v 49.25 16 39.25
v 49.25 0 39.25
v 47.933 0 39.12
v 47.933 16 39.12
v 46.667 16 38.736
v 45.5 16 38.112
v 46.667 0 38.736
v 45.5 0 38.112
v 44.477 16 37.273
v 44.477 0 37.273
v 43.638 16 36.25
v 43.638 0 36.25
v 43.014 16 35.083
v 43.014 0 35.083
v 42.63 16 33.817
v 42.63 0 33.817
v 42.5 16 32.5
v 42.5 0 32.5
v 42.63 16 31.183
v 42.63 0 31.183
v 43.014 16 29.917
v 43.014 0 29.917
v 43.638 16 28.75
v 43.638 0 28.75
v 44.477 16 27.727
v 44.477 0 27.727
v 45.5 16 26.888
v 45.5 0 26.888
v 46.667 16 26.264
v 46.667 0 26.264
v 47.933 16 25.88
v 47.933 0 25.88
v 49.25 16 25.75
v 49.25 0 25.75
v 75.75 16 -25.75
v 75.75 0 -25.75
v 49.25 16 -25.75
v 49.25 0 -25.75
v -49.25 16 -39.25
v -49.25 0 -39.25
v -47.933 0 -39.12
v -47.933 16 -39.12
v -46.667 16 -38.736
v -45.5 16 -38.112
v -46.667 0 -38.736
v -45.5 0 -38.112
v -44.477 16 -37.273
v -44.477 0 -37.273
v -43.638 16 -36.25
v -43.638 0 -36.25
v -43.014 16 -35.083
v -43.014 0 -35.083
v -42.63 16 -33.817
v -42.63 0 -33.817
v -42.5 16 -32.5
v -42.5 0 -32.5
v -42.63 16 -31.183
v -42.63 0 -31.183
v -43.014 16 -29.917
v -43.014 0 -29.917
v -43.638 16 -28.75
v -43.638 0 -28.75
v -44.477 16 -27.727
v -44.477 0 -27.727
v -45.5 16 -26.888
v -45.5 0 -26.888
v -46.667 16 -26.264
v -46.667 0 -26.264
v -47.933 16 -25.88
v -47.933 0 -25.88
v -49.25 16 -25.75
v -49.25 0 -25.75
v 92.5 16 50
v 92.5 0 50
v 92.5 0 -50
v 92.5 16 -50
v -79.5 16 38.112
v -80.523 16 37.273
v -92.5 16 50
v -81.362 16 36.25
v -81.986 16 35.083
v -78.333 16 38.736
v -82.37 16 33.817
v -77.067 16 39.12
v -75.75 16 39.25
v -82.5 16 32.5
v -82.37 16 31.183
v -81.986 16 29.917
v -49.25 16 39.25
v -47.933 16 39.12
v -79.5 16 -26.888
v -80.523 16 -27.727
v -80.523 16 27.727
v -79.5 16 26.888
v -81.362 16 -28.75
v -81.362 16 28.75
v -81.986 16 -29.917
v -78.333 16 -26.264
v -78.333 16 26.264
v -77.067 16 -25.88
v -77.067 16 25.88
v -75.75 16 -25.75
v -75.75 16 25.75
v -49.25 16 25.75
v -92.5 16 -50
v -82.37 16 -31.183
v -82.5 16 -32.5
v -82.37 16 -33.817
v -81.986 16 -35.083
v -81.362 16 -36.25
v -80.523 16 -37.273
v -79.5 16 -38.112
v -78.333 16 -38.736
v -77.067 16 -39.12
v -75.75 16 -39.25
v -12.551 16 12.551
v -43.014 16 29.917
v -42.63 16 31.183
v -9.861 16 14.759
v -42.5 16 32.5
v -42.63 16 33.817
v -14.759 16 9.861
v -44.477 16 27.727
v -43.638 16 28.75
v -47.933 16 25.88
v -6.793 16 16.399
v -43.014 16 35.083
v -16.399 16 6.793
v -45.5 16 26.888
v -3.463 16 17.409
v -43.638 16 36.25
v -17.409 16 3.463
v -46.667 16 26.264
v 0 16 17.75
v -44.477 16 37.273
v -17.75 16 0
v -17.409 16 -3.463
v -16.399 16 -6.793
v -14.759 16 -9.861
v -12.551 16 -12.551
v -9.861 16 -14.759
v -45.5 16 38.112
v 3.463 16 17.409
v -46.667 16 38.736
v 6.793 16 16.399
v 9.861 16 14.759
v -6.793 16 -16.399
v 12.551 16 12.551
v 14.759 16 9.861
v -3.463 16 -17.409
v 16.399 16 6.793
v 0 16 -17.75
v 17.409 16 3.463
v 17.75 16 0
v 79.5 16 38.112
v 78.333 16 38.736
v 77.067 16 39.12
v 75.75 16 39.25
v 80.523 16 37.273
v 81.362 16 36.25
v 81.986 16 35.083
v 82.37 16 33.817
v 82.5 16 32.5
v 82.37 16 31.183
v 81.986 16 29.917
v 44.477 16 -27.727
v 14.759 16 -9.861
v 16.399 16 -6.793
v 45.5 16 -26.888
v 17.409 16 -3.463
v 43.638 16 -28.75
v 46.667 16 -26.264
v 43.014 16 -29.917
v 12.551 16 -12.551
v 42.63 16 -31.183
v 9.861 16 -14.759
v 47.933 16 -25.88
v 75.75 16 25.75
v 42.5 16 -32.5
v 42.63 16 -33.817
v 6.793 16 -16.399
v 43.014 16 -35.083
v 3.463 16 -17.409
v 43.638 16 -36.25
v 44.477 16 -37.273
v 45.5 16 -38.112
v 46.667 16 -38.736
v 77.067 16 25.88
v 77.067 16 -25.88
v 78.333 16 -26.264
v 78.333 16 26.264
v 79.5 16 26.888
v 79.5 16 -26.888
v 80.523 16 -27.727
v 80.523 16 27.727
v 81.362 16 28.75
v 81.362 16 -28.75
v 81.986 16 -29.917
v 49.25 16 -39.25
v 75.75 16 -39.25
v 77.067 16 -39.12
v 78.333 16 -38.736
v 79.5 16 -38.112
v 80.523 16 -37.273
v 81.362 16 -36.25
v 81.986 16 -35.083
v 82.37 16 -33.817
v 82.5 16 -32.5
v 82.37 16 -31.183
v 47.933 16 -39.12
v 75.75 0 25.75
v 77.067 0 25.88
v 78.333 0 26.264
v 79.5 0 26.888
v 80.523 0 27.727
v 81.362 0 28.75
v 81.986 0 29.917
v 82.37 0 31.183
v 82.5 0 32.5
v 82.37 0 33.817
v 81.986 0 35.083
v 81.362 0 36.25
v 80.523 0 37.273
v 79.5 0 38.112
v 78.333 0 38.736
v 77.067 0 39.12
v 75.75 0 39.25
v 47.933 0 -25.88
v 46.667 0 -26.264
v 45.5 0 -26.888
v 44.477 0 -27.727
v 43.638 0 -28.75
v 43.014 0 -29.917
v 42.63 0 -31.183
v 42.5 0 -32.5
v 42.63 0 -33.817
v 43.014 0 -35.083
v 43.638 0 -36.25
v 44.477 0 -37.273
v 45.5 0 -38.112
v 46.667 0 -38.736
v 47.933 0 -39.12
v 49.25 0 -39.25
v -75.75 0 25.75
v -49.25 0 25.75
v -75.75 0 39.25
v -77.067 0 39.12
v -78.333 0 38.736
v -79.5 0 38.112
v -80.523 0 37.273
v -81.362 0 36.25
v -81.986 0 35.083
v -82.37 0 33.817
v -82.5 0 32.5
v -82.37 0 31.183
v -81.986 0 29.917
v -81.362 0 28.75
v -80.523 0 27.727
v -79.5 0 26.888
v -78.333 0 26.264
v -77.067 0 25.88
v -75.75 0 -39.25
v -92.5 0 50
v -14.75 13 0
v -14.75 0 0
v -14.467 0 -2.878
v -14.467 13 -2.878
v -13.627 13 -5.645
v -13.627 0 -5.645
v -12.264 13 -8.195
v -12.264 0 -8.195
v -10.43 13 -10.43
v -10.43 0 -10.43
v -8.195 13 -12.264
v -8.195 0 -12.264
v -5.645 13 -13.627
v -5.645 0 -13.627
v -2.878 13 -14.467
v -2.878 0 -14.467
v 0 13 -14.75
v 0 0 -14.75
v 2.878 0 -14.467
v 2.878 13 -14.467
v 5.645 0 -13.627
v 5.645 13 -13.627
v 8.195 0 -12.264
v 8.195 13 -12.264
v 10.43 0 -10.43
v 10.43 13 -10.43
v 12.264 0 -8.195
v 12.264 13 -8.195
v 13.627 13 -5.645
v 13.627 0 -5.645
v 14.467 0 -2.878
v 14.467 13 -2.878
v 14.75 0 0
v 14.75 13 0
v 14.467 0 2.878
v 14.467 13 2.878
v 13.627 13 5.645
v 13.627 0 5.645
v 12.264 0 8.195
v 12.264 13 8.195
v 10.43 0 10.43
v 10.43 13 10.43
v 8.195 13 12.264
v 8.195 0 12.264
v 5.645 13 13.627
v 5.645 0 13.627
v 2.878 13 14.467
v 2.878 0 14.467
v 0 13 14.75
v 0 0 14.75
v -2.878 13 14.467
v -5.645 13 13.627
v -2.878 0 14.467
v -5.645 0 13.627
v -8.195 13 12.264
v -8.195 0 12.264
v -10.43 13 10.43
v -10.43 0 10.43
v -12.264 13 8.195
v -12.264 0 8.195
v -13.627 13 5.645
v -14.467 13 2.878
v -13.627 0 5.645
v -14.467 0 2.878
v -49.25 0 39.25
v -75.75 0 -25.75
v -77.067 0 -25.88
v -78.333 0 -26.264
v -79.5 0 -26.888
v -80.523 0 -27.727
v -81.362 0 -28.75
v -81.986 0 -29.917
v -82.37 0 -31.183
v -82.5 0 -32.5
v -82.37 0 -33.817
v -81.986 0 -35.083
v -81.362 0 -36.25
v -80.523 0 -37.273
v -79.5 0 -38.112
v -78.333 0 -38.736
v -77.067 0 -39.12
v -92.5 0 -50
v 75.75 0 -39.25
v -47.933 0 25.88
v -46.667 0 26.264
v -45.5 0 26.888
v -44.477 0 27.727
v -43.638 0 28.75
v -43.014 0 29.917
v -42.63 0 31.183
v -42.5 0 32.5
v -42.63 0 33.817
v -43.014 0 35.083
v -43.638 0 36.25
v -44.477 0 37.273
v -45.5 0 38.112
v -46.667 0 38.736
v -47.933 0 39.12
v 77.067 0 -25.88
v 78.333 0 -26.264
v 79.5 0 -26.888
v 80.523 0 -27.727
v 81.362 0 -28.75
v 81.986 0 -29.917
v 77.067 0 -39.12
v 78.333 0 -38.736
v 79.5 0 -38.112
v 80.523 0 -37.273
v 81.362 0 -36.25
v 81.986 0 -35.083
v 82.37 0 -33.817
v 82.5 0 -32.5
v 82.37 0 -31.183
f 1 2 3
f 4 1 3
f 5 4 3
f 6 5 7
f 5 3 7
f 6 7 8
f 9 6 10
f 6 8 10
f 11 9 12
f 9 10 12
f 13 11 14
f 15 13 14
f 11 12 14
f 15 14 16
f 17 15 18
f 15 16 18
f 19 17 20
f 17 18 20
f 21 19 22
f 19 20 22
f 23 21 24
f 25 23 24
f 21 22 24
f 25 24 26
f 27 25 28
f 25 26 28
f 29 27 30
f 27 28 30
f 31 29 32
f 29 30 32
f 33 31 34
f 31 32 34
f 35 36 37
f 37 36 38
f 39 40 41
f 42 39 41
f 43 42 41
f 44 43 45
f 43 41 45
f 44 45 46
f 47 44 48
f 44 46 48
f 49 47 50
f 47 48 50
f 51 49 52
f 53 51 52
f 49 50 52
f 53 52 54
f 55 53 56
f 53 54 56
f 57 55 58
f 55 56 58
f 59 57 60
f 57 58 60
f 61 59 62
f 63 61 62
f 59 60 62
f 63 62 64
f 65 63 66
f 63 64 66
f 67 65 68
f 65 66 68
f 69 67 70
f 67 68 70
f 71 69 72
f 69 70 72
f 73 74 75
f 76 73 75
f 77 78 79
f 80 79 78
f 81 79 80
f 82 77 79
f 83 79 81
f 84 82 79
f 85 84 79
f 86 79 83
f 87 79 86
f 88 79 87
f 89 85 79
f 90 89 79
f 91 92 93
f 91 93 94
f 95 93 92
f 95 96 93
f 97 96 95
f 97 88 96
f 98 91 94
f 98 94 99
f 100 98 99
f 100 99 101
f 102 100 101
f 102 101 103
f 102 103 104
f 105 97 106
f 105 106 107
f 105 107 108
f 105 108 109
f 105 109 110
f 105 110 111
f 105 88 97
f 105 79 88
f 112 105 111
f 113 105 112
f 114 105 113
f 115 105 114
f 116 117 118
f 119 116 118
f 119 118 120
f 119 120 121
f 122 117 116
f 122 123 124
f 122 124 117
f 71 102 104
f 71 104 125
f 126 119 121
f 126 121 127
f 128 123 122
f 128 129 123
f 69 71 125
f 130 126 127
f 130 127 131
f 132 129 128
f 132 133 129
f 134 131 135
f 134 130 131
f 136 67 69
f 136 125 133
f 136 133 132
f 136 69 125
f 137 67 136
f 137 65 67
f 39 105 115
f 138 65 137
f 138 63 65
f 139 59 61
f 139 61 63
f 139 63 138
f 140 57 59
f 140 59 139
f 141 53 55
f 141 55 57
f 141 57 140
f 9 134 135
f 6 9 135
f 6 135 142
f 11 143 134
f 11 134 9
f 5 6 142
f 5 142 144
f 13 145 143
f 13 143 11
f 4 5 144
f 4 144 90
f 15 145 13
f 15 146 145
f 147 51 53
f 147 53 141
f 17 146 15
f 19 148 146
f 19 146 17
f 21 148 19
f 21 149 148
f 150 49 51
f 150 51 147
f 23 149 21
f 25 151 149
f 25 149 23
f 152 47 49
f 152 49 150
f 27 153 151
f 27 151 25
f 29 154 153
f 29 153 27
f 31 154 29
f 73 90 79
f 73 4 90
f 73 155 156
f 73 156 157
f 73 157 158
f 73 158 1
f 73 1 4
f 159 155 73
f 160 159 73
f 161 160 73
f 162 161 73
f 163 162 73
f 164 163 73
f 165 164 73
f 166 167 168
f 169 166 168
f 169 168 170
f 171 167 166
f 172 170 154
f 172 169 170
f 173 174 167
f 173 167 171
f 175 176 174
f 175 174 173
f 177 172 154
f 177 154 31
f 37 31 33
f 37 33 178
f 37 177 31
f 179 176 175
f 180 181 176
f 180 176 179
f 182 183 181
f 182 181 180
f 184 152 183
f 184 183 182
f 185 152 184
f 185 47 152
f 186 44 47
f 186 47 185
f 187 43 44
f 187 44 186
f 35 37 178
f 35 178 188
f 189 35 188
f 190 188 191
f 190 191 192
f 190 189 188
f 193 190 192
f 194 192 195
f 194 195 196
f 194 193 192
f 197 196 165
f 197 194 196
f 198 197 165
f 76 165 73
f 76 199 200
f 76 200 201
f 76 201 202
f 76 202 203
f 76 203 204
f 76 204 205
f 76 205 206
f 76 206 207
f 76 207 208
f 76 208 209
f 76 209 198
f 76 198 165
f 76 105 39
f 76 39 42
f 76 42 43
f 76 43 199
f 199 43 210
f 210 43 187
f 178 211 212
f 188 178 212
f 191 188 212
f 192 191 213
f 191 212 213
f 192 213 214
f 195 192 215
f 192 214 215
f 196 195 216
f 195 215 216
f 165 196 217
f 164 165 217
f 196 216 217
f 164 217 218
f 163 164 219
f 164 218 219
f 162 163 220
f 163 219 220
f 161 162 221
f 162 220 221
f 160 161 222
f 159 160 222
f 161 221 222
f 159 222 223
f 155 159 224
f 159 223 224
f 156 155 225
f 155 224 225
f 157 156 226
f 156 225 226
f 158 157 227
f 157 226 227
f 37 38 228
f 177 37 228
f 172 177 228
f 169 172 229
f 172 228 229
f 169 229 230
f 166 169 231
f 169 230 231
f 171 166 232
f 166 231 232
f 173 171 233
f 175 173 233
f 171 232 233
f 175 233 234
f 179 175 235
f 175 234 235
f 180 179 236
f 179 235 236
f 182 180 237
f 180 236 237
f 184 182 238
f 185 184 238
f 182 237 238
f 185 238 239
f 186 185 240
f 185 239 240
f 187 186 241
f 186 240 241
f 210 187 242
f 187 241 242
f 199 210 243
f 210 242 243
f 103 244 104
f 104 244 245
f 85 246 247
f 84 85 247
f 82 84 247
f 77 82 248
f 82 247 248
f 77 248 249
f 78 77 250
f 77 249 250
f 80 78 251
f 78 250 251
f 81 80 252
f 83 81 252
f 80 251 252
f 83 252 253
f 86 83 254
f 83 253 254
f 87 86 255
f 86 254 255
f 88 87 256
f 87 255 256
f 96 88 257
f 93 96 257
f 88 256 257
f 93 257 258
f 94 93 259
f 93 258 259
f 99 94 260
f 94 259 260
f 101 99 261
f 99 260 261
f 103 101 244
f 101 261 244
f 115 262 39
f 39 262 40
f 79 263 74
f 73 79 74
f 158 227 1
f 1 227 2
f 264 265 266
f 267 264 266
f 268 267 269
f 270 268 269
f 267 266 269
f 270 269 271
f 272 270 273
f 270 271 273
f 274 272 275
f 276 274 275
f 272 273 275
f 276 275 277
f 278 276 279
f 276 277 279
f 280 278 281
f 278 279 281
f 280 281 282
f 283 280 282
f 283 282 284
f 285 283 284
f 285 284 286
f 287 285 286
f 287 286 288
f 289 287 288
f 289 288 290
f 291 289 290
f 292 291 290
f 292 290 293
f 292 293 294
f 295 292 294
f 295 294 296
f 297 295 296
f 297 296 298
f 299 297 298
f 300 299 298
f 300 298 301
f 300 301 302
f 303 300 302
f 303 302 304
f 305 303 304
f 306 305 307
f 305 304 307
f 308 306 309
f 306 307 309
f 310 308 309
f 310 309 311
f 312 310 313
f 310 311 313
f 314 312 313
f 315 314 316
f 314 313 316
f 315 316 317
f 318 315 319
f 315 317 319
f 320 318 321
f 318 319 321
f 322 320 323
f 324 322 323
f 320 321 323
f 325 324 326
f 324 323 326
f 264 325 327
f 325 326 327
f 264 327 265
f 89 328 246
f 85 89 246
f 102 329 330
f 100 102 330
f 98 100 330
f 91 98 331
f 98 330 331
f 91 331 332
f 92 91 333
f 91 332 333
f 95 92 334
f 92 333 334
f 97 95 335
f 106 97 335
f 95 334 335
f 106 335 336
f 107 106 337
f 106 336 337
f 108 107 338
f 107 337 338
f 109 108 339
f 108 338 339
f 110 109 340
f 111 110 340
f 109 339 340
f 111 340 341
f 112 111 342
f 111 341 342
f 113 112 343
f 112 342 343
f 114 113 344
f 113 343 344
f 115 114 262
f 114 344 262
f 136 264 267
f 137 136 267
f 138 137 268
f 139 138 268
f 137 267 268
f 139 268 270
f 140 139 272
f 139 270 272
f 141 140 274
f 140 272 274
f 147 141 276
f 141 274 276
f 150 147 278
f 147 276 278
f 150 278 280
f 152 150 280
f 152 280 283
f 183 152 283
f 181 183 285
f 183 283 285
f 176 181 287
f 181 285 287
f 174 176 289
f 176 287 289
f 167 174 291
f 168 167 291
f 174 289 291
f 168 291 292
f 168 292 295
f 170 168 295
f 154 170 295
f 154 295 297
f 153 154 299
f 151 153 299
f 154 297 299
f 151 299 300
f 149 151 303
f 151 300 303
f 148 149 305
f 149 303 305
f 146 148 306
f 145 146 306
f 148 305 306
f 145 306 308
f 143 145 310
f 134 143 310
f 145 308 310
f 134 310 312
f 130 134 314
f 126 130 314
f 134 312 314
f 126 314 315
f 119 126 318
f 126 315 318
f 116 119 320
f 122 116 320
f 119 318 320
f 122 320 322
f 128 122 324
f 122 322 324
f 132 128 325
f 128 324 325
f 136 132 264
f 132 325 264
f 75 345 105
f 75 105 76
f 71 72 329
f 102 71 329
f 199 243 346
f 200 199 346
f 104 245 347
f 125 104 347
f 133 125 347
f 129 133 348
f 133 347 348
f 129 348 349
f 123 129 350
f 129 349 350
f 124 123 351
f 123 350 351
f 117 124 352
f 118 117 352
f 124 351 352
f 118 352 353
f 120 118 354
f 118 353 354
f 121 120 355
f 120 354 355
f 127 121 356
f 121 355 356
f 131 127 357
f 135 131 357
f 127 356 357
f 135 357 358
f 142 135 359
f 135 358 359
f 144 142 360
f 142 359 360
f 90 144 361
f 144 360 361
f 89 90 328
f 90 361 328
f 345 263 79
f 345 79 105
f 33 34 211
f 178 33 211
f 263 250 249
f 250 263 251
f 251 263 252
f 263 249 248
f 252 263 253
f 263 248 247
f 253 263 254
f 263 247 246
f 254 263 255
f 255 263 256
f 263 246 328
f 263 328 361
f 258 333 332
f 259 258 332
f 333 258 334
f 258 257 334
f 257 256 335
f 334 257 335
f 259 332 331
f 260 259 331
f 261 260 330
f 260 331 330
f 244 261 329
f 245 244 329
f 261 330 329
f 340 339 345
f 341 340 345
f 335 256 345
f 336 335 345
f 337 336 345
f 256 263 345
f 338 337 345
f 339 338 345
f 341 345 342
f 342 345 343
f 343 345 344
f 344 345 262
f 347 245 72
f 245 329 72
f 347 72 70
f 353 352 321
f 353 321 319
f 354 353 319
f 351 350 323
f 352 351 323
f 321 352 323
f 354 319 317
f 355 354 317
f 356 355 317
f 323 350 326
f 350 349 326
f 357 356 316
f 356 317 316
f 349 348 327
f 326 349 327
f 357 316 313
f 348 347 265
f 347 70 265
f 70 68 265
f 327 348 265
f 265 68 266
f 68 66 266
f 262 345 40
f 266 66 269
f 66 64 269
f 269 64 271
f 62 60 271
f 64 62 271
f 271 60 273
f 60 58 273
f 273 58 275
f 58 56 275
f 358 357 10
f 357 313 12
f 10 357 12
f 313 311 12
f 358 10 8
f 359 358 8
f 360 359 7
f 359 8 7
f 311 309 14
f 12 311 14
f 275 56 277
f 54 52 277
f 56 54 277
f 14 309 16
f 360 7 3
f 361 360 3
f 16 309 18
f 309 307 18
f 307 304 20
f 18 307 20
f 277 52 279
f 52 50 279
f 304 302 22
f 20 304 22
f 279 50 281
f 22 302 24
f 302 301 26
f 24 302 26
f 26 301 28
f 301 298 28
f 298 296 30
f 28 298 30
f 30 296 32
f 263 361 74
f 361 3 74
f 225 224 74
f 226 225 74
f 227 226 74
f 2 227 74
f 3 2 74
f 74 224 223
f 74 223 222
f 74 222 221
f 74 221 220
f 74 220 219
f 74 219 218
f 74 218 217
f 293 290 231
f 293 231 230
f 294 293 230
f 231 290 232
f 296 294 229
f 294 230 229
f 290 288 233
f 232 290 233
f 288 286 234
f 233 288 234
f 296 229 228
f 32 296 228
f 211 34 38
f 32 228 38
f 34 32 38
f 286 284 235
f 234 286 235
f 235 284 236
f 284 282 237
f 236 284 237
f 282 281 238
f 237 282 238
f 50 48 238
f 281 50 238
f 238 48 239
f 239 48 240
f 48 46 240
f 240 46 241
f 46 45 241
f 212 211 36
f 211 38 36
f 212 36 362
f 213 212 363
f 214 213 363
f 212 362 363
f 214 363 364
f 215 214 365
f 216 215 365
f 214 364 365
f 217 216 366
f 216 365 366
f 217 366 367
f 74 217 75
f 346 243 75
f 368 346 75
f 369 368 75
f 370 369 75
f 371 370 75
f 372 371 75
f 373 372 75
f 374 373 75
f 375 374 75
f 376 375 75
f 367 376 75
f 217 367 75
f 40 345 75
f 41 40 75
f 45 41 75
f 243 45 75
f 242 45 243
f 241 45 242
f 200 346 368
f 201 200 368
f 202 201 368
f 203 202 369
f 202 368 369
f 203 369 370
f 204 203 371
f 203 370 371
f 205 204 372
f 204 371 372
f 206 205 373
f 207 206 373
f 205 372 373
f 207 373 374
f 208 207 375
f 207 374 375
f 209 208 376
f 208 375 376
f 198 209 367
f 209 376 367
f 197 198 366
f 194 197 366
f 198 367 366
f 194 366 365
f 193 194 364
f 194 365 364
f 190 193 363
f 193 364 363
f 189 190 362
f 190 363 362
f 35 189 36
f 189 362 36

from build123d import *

# Parameters (mm, degrees)
SKETCH1_W               = 185
SKETCH1_H               = 100
BOSS_EXTRUDE1_DEPTH     = 16
CUT_EXTRUDE1_DEPTH      = 107.359061673
CUT_EXTRUDE1_DEPTH_BACK = 107.359061673
F_1_0MM_DOWEL_HOLE1_D   = 29.5
CHAMFER1_SIZE           = 3


with BuildPart() as part:
    # Sketch1 → Boss-Extrude1 (new body)
    with BuildSketch(Plane(origin=(0, 0, 0), x_dir=(1, 0, 0), z_dir=(0, 1, 0))):
        Rectangle(SKETCH1_W, SKETCH1_H)
    extrude(amount=BOSS_EXTRUDE1_DEPTH)

    # Sketch2 → Cut-Extrude1 (cut, two sides: drawn at the far end of the back side and taken through both)
    with BuildSketch(Plane(origin=(0, 16, 0), x_dir=(1, 0, 0), z_dir=(0, 1, 0)).offset(-CUT_EXTRUDE1_DEPTH_BACK)):
        with BuildLine():
            Line((-75.75, 39.25), (-49.25, 39.25))
            ThreePointArc((-49.25, 39.25), (-42.5, 32.5), (-49.25, 25.75))
            Line((-49.25, 25.75), (-75.75, 25.75))
            ThreePointArc((-75.75, 25.75), (-82.5, 32.5), (-75.75, 39.25))
        make_face()
        with BuildLine():
            Line((-49.25, -39.25), (-75.75, -39.25))
            ThreePointArc((-75.75, -39.25), (-82.5, -32.5), (-75.75, -25.75))
            Line((-75.75, -25.75), (-49.25, -25.75))
            ThreePointArc((-49.25, -25.75), (-42.5, -32.5), (-49.25, -39.25))
        make_face()
        with BuildLine():
            Line((49.25, 39.25), (75.75, 39.25))
            ThreePointArc((75.75, 39.25), (82.5, 32.5), (75.75, 25.75))
            Line((75.75, 25.75), (49.25, 25.75))
            ThreePointArc((49.25, 25.75), (42.5, 32.5), (49.25, 39.25))
        make_face()
        with BuildLine():
            Line((49.25, -25.75), (75.75, -25.75))
            ThreePointArc((75.75, -25.75), (82.5, -32.5), (75.75, -39.25))
            Line((75.75, -39.25), (49.25, -39.25))
            ThreePointArc((49.25, -39.25), (42.5, -32.5), (49.25, -25.75))
        make_face()
    extrude(amount=CUT_EXTRUDE1_DEPTH + CUT_EXTRUDE1_DEPTH_BACK, mode=Mode.SUBTRACT)

    # Ø1.0mm Dowel Hole1 (through all)
    with Locations(Plane(origin=(0, 16, 0), x_dir=(1, 0, 0), z_dir=(0, 1, 0))):
        with Locations((0, 0)):
            Hole(F_1_0MM_DOWEL_HOLE1_D / 2)

    # Chamfer1
    chamfer1_edges = [part.edges().sort_by_distance(p)[0] for p in [
        (14.75, 16, 0),
    ]]
    chamfer(chamfer1_edges, length=CHAMFER1_SIZE)


solid = part.part
